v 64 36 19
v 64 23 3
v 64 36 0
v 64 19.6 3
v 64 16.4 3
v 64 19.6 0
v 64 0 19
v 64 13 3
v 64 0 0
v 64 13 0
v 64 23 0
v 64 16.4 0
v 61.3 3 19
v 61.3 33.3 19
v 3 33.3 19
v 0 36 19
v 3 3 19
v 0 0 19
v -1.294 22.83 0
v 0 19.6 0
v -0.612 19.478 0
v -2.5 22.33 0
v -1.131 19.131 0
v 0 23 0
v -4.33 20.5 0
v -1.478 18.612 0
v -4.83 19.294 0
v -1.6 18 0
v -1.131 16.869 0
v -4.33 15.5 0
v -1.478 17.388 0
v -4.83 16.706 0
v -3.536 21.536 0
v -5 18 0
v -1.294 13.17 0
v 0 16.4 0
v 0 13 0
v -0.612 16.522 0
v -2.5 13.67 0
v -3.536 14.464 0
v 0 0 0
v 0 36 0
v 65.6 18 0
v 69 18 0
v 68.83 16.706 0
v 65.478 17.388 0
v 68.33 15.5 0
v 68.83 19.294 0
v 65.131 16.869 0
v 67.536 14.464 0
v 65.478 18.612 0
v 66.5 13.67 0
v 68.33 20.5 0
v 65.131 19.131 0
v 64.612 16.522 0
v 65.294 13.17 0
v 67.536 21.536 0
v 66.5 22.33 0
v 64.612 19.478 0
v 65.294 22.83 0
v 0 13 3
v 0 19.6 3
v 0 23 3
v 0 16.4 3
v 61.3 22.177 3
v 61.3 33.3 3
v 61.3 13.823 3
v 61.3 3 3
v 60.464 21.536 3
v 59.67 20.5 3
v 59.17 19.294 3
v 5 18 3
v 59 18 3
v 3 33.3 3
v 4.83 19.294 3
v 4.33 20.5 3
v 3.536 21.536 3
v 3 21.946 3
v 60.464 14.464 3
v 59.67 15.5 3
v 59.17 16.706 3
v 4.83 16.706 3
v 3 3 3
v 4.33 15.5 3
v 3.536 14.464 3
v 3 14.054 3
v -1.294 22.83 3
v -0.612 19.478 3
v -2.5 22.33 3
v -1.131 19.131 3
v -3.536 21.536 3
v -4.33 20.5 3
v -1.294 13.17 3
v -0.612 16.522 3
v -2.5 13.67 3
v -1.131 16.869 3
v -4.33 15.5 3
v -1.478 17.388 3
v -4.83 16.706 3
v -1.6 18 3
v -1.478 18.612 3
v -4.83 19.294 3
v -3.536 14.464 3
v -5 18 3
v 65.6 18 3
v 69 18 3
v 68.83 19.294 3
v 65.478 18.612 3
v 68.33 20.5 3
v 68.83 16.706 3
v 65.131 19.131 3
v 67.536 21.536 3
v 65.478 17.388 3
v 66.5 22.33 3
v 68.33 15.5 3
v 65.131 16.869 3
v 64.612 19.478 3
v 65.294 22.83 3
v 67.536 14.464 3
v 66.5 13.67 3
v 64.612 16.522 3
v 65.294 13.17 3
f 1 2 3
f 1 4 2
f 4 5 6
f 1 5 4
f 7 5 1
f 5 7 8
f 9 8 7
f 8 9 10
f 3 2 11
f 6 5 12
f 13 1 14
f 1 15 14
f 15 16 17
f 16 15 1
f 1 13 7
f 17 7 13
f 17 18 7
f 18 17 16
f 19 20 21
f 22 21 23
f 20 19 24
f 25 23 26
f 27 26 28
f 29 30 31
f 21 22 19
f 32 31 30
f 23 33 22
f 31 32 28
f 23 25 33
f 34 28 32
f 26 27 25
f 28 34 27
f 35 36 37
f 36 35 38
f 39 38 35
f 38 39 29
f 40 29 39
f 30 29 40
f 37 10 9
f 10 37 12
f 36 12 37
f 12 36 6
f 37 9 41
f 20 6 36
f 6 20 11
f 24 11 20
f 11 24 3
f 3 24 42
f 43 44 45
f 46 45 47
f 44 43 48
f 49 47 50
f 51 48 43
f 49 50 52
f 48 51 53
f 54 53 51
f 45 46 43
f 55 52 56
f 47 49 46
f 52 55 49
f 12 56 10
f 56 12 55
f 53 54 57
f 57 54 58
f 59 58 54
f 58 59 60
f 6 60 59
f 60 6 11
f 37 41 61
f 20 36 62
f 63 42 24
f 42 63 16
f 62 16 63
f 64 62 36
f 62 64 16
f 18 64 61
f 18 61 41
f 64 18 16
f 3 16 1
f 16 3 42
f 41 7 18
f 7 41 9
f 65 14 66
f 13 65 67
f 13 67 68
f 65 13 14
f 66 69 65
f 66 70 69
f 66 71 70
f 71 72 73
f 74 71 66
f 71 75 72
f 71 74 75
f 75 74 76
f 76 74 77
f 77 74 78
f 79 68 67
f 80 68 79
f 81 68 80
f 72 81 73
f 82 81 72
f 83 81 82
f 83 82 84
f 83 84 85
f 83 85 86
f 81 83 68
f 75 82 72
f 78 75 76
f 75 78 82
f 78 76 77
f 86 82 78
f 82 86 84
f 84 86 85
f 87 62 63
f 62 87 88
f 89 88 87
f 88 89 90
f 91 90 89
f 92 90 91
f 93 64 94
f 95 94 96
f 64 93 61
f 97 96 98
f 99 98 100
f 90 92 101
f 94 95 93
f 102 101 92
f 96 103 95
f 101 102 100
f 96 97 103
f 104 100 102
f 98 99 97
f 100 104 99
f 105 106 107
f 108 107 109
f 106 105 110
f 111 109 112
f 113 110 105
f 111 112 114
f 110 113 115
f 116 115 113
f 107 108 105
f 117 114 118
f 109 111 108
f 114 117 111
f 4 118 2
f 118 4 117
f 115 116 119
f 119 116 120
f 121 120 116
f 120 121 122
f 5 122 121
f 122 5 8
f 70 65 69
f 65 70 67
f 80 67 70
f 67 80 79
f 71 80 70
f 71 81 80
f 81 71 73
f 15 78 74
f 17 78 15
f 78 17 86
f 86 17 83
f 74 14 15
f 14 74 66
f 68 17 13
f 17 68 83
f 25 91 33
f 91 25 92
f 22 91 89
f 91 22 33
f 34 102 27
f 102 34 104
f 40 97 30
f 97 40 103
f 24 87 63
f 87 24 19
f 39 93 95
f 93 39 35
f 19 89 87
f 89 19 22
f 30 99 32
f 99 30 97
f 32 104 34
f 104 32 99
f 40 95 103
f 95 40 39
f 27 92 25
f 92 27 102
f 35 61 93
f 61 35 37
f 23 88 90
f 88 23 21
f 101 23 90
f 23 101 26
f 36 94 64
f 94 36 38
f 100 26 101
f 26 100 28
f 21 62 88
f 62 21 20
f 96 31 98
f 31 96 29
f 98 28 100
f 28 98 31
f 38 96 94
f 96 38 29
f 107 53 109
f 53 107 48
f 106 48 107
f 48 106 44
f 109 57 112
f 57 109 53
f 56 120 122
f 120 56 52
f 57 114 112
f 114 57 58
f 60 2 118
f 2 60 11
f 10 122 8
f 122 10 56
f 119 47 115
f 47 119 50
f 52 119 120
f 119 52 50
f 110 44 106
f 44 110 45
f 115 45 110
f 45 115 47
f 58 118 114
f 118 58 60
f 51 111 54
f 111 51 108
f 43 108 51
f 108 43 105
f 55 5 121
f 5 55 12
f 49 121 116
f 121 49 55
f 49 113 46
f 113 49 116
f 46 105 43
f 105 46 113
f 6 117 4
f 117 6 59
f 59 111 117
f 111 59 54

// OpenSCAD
// file: params.scad
// =========================================================
// Robot Layla — Paramètres communs à toutes les pièces
// Modifiez ces valeurs selon vos composants réels avant
// d'exporter les STL (mesurez vos moteurs/écran au pied à
// coulisse si possible, les kits varient légèrement).
// =========================================================

// --- Général ---
wall = 3;              // épaisseur de paroi standard (mm)
tolerance = 0.3;       // jeu pour les pièces qui s'emboîtent (mm)

// --- Châssis / base ---
base_length = 120;     // longueur de la base (mm)
base_width  = 100;     // largeur de la base (mm)
base_height = 25;      // hauteur des parois de la base (mm)
corner_radius = 15;    // rayon des coins arrondis de la base

// --- Moteurs (kit "TT motor gearbox" standard) ---
motor_length = 70;     // longueur du moteur + boîte de vitesse (mm)
motor_width  = 22;     // largeur du moteur (mm)
motor_height = 18;     // hauteur du moteur (mm)
motor_shaft_offset = 9; // hauteur de l'axe par rapport au bas du moteur (mm)

// --- Roulette folle ---
caster_diameter = 25;  // diamètre de la roulette (mm)
caster_mount_hole = 3; // diamètre des trous de fixation (mm)

// --- Tête / écran OLED ---
head_diameter = 90;    // diamètre de la tête (mm)
head_height   = 60;    // hauteur de la tête (mm)
oled_width  = 27.3;    // largeur de la carte OLED SSD1306 0.96" (mm)
oled_height = 27.8;    // hauteur de la carte OLED (mm)
oled_screen_width  = 21.7; // zone d'affichage utile (mm)
oled_screen_height = 11.2;
oled_thickness = 4;    // épaisseur approx de la carte + connecteurs (mm)

// --- Capteur ultrason (le "nez") ---
us_width  = 45;        // largeur du HC-SR04 (mm)
us_height = 20;         // hauteur du HC-SR04 (mm)
us_eye_diameter = 16;   // diamètre des "yeux" du capteur (les 2 cylindres)
us_eye_spacing = 26;    // entraxe entre les 2 cylindres du capteur

// --- Oreilles ---
ear_base_diameter = 30; // diamètre à la base de l'oreille (mm)
ear_height = 35;        // hauteur de l'oreille (mm)
ear_spacing = 60;       // écart entre les 2 oreilles (mm)

// --- Vis M3 ---
m3_diameter = 3.2;      // diamètre de perçage pour vis M3 (passage libre)
m3_head_diameter = 6.5; // diamètre de la tête de vis M3 (pour fraisage)
// main file
// =========================================================
// Robot Layla — Support batterie / pack de piles
// Tiroir simple qui se glisse sous la base, pour loger le
// pack 4xAA et faciliter le changement des piles.
// =========================================================
include <params.scad>

battery_pack_length = 58; // pack 4xAA standard
battery_pack_width  = 30;
battery_pack_height = 16;

module battery_tray() {
    difference() {
        cube([battery_pack_length + wall*2, battery_pack_width + wall*2, battery_pack_height + wall]);
        translate([wall, wall, wall])
            cube([battery_pack_length + tolerance, battery_pack_width + tolerance, battery_pack_height + tolerance]);
    }
    // languettes de fixation (vis M3) de chaque côté
    for (x = [0, battery_pack_length + wall*2])
        translate([x, (battery_pack_width + wall*2)/2, 0])
            difference() {
                cylinder(h = wall, d = 10, $fn = 24);
                cylinder(h = wall, d = m3_diameter, $fn = 16);
            }
}

battery_tray();

// NOTE: à fixer sous la base.scad avec 2 vis M3, ou simplement
// scotcher/velcro si vous préférez un montage amovible plus simple
// pour changer les piles facilement avec votre fille.
